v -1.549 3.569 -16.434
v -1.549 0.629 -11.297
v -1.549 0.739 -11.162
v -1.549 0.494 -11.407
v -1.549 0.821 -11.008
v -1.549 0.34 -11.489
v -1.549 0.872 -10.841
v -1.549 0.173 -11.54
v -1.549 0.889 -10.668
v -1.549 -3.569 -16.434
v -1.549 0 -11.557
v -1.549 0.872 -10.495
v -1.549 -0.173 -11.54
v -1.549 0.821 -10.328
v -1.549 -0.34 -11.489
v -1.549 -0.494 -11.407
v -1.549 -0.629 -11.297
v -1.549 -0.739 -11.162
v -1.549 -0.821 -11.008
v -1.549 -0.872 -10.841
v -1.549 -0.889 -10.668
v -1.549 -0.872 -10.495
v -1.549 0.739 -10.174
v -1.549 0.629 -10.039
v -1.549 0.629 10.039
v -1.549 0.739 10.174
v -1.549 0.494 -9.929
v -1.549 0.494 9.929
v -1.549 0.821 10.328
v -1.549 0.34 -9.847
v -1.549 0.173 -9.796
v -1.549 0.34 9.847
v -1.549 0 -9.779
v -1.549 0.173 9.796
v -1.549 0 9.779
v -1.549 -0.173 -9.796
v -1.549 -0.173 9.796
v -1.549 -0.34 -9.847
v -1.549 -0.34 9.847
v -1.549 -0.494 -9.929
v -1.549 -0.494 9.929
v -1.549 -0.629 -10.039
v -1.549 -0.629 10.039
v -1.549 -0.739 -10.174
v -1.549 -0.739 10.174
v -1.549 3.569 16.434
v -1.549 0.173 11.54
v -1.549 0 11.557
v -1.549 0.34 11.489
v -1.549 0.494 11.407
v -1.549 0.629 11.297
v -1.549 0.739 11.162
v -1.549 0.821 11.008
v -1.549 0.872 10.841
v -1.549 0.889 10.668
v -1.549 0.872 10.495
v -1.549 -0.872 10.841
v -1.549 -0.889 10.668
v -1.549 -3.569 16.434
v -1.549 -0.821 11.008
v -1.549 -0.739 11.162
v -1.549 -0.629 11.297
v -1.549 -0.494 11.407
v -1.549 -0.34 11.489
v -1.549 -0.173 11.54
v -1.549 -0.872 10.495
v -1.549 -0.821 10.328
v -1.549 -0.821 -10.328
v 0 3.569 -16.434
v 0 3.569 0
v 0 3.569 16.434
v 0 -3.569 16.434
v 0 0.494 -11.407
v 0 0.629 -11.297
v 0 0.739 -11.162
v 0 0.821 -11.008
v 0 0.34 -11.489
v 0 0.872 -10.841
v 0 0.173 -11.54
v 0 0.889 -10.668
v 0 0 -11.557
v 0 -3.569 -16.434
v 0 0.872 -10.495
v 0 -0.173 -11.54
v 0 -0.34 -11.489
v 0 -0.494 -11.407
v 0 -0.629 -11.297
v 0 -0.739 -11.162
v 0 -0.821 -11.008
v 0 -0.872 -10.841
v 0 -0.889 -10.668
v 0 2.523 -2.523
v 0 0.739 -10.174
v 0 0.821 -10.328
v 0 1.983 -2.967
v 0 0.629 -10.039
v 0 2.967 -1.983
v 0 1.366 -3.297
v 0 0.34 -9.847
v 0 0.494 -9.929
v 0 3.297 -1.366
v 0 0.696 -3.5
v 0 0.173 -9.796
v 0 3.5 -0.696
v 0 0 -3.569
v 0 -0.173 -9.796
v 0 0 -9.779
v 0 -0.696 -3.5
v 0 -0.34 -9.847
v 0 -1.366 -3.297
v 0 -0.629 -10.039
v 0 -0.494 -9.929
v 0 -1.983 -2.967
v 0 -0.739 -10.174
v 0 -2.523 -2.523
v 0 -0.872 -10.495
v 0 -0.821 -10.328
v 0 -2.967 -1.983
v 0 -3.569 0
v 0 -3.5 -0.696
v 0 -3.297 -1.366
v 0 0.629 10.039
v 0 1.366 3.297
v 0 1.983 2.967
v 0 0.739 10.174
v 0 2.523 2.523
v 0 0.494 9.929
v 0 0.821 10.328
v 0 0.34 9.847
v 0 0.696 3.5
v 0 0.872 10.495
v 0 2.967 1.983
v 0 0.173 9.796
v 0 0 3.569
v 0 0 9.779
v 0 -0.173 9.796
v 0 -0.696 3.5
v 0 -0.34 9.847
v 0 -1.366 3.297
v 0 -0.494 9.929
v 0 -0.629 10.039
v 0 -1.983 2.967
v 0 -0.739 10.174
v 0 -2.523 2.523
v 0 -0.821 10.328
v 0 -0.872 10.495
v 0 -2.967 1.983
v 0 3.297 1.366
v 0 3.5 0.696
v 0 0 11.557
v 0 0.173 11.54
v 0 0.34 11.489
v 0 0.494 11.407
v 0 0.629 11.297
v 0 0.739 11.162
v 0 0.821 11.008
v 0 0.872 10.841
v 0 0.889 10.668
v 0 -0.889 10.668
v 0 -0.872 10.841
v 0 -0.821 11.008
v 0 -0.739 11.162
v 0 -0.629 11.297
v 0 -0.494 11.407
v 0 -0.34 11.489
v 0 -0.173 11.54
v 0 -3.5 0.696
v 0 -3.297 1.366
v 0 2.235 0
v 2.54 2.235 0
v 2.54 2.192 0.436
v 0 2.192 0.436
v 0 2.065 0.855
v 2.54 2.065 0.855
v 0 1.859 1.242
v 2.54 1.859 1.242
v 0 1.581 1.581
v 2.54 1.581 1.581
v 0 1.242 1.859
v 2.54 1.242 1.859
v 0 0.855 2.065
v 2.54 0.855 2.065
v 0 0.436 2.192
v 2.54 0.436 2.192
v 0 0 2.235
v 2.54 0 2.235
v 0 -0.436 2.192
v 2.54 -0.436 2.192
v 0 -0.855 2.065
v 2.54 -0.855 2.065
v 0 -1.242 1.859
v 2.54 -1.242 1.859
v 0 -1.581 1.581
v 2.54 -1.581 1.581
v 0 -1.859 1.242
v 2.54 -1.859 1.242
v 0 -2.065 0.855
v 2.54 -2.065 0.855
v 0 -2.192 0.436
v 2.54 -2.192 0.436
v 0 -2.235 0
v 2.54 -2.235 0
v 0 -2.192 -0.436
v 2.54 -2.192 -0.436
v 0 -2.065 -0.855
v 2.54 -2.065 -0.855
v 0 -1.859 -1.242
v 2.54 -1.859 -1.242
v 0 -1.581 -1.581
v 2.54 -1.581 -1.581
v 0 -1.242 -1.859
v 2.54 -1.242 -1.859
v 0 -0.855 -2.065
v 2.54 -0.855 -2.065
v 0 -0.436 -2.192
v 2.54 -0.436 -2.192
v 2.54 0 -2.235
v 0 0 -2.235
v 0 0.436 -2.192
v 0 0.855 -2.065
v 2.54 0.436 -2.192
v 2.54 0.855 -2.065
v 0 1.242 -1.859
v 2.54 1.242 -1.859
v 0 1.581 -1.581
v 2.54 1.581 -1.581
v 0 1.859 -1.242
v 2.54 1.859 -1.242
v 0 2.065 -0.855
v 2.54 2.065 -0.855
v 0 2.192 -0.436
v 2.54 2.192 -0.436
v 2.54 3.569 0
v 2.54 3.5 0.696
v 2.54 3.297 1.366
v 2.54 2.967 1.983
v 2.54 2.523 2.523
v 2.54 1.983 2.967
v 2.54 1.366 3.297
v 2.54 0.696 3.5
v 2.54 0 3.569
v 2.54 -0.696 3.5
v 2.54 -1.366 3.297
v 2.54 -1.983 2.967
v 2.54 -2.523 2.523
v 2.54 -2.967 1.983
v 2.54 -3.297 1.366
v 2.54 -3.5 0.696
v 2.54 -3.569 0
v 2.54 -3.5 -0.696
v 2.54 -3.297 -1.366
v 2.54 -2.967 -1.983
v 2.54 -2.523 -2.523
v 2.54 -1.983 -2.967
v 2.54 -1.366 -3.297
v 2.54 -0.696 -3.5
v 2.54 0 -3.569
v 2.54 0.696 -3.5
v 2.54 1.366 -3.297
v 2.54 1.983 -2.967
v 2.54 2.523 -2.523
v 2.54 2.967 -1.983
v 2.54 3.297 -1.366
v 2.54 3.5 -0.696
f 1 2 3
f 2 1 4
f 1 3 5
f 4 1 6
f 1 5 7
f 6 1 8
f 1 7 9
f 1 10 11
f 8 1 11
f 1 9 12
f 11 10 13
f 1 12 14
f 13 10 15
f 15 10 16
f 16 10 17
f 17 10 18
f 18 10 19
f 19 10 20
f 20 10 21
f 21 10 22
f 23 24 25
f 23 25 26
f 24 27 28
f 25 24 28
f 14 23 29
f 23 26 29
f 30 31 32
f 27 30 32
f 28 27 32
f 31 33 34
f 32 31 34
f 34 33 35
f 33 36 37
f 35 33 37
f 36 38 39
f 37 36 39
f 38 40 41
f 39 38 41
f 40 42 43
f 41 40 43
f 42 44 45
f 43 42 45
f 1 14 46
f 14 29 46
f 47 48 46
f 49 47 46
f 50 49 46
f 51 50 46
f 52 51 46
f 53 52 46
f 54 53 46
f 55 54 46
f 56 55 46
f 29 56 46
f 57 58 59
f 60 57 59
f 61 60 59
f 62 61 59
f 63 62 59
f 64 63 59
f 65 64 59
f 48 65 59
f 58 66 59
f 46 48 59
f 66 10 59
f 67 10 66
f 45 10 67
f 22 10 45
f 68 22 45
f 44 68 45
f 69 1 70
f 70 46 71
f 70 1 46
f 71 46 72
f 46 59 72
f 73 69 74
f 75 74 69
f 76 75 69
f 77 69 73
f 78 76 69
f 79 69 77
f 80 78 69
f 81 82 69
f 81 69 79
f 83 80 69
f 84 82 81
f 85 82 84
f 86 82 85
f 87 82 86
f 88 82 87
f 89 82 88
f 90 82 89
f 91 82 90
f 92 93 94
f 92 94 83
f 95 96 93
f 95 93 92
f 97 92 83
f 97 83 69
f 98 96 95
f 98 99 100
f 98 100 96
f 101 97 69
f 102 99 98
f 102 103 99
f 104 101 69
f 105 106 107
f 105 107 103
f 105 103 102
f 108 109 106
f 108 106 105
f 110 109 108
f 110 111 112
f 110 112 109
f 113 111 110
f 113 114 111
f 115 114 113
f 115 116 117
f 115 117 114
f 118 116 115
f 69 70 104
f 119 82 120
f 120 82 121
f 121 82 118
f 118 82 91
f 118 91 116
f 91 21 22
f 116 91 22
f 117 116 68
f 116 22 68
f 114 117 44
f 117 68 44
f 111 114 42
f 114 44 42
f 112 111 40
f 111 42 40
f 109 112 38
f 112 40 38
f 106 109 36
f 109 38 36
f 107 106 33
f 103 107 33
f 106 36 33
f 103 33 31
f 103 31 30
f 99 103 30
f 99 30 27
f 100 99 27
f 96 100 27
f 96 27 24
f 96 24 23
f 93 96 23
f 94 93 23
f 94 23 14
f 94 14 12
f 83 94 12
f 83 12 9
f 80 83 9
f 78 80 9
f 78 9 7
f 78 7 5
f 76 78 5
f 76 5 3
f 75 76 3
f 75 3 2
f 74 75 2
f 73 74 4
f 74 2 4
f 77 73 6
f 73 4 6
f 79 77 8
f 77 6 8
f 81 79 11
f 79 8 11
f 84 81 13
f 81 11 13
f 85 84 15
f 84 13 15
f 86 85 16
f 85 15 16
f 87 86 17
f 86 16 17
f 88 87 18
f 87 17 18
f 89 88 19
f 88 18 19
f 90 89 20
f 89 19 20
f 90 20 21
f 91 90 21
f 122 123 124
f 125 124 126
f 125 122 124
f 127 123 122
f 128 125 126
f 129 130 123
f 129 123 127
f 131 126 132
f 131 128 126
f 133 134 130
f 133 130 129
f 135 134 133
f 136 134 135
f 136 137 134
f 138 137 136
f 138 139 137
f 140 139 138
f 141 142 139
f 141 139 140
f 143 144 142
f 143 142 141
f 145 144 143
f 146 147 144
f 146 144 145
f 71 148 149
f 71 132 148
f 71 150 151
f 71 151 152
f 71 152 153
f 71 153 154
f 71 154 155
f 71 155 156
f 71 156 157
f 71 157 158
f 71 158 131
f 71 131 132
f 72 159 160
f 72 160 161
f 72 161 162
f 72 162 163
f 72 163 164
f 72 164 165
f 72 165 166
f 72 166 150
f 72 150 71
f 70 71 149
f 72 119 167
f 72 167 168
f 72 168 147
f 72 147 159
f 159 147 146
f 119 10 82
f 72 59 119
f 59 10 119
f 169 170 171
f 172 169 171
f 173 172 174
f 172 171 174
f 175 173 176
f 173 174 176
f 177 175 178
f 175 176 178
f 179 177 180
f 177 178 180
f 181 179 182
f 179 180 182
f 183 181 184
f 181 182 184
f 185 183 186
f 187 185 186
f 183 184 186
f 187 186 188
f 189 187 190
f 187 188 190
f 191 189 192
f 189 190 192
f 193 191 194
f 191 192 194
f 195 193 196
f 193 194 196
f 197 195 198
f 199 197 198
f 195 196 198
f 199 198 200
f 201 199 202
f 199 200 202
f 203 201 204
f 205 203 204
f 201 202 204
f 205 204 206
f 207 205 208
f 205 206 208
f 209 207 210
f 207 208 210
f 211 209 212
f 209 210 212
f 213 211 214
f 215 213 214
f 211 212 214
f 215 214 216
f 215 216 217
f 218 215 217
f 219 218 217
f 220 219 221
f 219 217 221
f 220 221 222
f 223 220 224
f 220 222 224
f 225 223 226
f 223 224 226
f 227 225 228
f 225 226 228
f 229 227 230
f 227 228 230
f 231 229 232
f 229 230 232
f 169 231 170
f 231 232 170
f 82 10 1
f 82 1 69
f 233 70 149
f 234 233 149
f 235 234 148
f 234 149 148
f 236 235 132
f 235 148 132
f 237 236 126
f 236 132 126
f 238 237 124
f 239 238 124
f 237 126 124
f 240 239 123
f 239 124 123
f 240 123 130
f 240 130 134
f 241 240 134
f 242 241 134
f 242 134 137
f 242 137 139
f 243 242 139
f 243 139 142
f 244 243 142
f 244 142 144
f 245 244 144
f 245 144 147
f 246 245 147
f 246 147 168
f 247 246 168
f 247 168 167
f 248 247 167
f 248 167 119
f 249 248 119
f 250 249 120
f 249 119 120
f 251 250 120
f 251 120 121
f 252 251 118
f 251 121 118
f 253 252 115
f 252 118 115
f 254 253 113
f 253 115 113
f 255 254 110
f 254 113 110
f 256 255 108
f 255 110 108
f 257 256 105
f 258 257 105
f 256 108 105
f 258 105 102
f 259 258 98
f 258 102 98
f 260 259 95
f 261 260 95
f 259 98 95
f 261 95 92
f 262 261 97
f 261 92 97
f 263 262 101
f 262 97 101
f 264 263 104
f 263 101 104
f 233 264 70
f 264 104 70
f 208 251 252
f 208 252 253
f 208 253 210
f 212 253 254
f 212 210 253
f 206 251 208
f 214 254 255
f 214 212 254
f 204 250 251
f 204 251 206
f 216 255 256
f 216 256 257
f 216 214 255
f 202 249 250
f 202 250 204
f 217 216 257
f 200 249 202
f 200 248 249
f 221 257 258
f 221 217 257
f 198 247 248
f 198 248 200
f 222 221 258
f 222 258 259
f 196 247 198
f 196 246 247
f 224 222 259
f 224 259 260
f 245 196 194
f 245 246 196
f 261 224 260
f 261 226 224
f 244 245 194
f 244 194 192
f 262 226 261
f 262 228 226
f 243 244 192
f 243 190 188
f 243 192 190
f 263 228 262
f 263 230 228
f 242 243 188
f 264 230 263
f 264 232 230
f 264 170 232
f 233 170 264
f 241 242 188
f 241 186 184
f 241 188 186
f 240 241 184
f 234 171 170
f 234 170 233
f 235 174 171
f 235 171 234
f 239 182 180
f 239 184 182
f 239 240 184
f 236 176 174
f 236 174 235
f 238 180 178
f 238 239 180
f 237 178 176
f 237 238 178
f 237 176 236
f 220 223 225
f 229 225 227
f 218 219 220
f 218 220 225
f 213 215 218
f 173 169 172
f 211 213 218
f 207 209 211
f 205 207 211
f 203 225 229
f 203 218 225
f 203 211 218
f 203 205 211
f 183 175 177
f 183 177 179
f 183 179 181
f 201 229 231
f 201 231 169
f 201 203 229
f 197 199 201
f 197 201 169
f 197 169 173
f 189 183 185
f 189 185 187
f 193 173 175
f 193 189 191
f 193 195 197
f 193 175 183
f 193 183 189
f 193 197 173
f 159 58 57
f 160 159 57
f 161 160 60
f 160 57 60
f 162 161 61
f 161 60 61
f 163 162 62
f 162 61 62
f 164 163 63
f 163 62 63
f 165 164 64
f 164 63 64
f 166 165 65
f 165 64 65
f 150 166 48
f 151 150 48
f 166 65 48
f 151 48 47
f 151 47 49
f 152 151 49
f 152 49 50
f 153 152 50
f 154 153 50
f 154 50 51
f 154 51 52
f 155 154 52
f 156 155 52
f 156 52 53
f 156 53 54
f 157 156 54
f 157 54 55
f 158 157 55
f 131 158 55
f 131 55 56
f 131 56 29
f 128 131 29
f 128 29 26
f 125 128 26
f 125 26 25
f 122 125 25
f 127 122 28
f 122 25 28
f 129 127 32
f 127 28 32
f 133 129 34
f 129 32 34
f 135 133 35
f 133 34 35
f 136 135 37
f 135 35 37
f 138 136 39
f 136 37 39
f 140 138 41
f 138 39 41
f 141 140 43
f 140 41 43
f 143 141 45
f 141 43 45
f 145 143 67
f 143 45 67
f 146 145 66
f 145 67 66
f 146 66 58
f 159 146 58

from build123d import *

# Parameters (mm, degrees)
F0_R     = 3.5687
F1_DEPTH = 2.54
F2_R     = 2.2352
F3_DEPTH = 2.54
F4_W     = 1.5494
F4_H     = 32.8676
F5_DEPTH = 3.5687
F6_R     = 0.889
F7_DEPTH = 25.4


with BuildPart() as f1:
    # F0 (on Right) → F1 (new body)
    with BuildSketch(Plane.YZ):
        Circle(F0_R)
    extrude(amount=F1_DEPTH)

    # F2 (on face) → F3 (cut)
    with BuildSketch(Plane.YZ.offset(2.54)):
        Circle(F2_R)
    extrude(amount=-F3_DEPTH, mode=Mode.SUBTRACT)

    # F4 (on Front) → F5 (join, symmetric)
    with BuildSketch(Plane.XZ):
        with Locations((-0.7747, 0)):
            Rectangle(F4_W, F4_H)
    extrude(amount=F5_DEPTH, both=True)

    # F6 (on face) → F7 (cut)
    with BuildSketch(Plane(origin=(-1.5494, 0, 0), x_dir=(0, -1, 0), z_dir=(-1, 0, 0))):
        with Locations((0, -10.668)):
            Circle(F6_R)
        with Locations((0, 10.668)):
            Circle(F6_R)
    extrude(amount=-F7_DEPTH, mode=Mode.SUBTRACT)


solid = f1.part
